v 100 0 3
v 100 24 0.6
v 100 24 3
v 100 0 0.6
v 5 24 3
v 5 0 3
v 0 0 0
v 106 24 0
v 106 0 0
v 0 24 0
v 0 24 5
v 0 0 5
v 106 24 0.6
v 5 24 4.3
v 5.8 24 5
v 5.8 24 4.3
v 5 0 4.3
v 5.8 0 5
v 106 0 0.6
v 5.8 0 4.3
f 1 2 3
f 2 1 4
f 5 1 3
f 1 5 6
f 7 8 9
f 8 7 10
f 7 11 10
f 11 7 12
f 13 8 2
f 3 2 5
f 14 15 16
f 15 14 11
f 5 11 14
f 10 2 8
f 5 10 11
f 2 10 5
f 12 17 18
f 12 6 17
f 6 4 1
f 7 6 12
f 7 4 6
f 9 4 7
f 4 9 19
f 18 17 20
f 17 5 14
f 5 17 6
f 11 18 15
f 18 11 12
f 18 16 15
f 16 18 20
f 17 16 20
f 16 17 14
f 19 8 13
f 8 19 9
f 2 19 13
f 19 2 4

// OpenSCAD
/* Bag clip with living hinge - PETG, 0.4mm nozzle, no supports
   Printed open flat (single print, fuses into one piece), folds shut on 2mm folded bag.
   Two verification parts (lower + upper) that fuse at hinge when printed together.
   Assembly shows closed on bag, motion "closing" folds upper onto lower/bag.
*/
/* [Print] */
part = "lower"; // [lower, upper, assembly]

cadverify_only = "";
module instance(name, part, unit = 1) {
    echo(cadverify_instance = [name, part, unit]);
    if (cadverify_only == "" || cadverify_only == name) children();
}

// ---- parameters (mm) ----
arm_len = 100;
arm_w = 24;
arm_t = 3;
hinge_len = 6;
hinge_t = 0.6;
tab_len = 12;
heel_len = 8;
catch_w = 5;
lip = 0.8;
lip_t = 0.7;
bag_t = 2;

lower_xmax = 106;      // 0..106
upper_len_print = 112; // 0..112
closed_h = 8.2;
pivot_x = 103.05;
pivot_z = 4.1;

module lower_geo() {
    // base
    cube([100, arm_w, arm_t]);
    // catch block at free end (x 0..5), overlap into base
    translate([0, 0, 2.98]) cube([5, arm_w, 2.02]);
    // catch lip protruding +x, overlap into block
    translate([4.98, 0, 4.3]) cube([0.82, arm_w, 0.7]);
    // living hinge leaf, overlap into base
    translate([99.98, 0, 0]) cube([6.02, arm_w, hinge_t]);
}

module upper_geo() {
    // base 0..100
    cube([100, arm_w, arm_t]);
    // heel at hinge end on top
    translate([0, 0, 2.98]) cube([8, arm_w, 2.02]);
    // hook leg near free end on top
    translate([92.2, 0, 2.98]) cube([2, arm_w, 1.82]);
    // hook lip protruding +x from leg side
    translate([94.18, 0, 4.1]) cube([0.82, arm_w, 0.7]);
    // thumb tab extension beyond free end
    translate([99.98, 0, 0]) cube([12.02, arm_w, arm_t]);
}

module bag_geo() {
    translate([8, 0, 3]) cube([84, arm_w, bag_t]);
}

if (part == "lower") {
    echo(cadverify_spec = [
        ["bounds", [[0, 0, 0], [106, 24, 5]]],
        ["bodies", 1],
        ["through_holes", 0],
        ["support_faces", [["bed", "-z", 500]]],
        ["overhangs_allowed", [["catch lip bridge", [[4.5, 0, 4.0], [6.2, 24, 5.1]]]]],
        ["copies", 1],
        ["details", [
            ["base", "material", [[10, 0, 0], [90, 24, 3]], 1],
            ["catch", "material", [[0, 0, 3], [5, 24, 5]], 1],
            ["catch_lip", "material", [[5.0, 0.1, 4.35], [5.75, 23.9, 4.95]], 0.9],
            ["hinge", "material", [[100.05, 0.1, 0.05], [105.95, 23.9, 0.55]], 0.9],
            ["hook_space", "void", [[5.8, 0, 3], [8.6, 24, 5.4]], 1],
            ["bag_space", "void", [[8, 0, 5.1], [92, 24, 7]], 1],
            ["wall", "thickness", [50, 12, 6], [0, 0, -1], 3],
            ["film", "thickness", [103, 12, 2], [0, 0, -1], 0.6],
            ["hinge_top", "view", [[99, 0, 0], [107, 24, 1]]]
        ]]
    ]);
    lower_geo();
} else if (part == "upper") {
    echo(cadverify_spec = [
        ["bounds", [[0, 0, 0], [112, 24, 5]]],
        ["bodies", 1],
        ["through_holes", 0],
        ["support_faces", [["bed", "-z", 500]]],
        ["overhangs_allowed", [["hook lip bridge", [[91.5, 0, 2.8], [96, 24, 5]]]]],
        ["copies", 1],
        ["details", [
            ["heel", "material", [[0, 0, 3], [8, 24, 5]], 1],
            ["arm", "material", [[10, 0, 0], [80, 24, 3]], 1],
            ["hook_leg", "material", [[92.3, 0.1, 3.05], [94.1, 23.9, 4.75]], 0.9],
            ["hook_lip", "material", [[94.2, 0.1, 4.15], [94.95, 23.9, 4.75]], 0.9],
            ["tab", "material", [[100, 0, 0], [112, 24, 3]], 1],
            ["catch_space", "void", [[95, 0, 3], [99.9, 24, 5]], 1],
            ["wall", "thickness", [50, 12, 6], [0, 0, -1], 3],
            ["heel_wall", "thickness", [4, 12, 7], [0, 0, -1], 5],
            ["thumb", "view", [[99, 0, 0], [113, 24, 3.5]]]
        ]]
    ]);
    upper_geo();
} else if (part == "assembly") {
    echo(cadverify_spec = [
        ["bounds", [[-12, 0, 0], [106, 24, 8.2]]],
        ["support_faces", [["bed", "-z", 1000]]],
        ["motions", [
            ["closing", ["upper"], "rotate", [103.05, 12, 4.1], [0, 1, 0], [0, 180],
                ["flex", [["upper", "lower", 1, "latch snap and heel clearance"]]]]
        ]],
        ["assembly_order", [
            [["lower"], [0, 0, 0]],
            [["bag"], [0, 0, -1]],
            [["upper"], [0, 0, -1], ["flex", [["upper", "lower", 1, "latch snap"]]]]
        ]]
    ]);
    instance("lower", "lower") lower_geo();
    instance("upper", "upper") translate([100, 0, 8.2]) rotate([0, 180, 0]) upper_geo();
    instance("bag", "external") bag_geo();
}
